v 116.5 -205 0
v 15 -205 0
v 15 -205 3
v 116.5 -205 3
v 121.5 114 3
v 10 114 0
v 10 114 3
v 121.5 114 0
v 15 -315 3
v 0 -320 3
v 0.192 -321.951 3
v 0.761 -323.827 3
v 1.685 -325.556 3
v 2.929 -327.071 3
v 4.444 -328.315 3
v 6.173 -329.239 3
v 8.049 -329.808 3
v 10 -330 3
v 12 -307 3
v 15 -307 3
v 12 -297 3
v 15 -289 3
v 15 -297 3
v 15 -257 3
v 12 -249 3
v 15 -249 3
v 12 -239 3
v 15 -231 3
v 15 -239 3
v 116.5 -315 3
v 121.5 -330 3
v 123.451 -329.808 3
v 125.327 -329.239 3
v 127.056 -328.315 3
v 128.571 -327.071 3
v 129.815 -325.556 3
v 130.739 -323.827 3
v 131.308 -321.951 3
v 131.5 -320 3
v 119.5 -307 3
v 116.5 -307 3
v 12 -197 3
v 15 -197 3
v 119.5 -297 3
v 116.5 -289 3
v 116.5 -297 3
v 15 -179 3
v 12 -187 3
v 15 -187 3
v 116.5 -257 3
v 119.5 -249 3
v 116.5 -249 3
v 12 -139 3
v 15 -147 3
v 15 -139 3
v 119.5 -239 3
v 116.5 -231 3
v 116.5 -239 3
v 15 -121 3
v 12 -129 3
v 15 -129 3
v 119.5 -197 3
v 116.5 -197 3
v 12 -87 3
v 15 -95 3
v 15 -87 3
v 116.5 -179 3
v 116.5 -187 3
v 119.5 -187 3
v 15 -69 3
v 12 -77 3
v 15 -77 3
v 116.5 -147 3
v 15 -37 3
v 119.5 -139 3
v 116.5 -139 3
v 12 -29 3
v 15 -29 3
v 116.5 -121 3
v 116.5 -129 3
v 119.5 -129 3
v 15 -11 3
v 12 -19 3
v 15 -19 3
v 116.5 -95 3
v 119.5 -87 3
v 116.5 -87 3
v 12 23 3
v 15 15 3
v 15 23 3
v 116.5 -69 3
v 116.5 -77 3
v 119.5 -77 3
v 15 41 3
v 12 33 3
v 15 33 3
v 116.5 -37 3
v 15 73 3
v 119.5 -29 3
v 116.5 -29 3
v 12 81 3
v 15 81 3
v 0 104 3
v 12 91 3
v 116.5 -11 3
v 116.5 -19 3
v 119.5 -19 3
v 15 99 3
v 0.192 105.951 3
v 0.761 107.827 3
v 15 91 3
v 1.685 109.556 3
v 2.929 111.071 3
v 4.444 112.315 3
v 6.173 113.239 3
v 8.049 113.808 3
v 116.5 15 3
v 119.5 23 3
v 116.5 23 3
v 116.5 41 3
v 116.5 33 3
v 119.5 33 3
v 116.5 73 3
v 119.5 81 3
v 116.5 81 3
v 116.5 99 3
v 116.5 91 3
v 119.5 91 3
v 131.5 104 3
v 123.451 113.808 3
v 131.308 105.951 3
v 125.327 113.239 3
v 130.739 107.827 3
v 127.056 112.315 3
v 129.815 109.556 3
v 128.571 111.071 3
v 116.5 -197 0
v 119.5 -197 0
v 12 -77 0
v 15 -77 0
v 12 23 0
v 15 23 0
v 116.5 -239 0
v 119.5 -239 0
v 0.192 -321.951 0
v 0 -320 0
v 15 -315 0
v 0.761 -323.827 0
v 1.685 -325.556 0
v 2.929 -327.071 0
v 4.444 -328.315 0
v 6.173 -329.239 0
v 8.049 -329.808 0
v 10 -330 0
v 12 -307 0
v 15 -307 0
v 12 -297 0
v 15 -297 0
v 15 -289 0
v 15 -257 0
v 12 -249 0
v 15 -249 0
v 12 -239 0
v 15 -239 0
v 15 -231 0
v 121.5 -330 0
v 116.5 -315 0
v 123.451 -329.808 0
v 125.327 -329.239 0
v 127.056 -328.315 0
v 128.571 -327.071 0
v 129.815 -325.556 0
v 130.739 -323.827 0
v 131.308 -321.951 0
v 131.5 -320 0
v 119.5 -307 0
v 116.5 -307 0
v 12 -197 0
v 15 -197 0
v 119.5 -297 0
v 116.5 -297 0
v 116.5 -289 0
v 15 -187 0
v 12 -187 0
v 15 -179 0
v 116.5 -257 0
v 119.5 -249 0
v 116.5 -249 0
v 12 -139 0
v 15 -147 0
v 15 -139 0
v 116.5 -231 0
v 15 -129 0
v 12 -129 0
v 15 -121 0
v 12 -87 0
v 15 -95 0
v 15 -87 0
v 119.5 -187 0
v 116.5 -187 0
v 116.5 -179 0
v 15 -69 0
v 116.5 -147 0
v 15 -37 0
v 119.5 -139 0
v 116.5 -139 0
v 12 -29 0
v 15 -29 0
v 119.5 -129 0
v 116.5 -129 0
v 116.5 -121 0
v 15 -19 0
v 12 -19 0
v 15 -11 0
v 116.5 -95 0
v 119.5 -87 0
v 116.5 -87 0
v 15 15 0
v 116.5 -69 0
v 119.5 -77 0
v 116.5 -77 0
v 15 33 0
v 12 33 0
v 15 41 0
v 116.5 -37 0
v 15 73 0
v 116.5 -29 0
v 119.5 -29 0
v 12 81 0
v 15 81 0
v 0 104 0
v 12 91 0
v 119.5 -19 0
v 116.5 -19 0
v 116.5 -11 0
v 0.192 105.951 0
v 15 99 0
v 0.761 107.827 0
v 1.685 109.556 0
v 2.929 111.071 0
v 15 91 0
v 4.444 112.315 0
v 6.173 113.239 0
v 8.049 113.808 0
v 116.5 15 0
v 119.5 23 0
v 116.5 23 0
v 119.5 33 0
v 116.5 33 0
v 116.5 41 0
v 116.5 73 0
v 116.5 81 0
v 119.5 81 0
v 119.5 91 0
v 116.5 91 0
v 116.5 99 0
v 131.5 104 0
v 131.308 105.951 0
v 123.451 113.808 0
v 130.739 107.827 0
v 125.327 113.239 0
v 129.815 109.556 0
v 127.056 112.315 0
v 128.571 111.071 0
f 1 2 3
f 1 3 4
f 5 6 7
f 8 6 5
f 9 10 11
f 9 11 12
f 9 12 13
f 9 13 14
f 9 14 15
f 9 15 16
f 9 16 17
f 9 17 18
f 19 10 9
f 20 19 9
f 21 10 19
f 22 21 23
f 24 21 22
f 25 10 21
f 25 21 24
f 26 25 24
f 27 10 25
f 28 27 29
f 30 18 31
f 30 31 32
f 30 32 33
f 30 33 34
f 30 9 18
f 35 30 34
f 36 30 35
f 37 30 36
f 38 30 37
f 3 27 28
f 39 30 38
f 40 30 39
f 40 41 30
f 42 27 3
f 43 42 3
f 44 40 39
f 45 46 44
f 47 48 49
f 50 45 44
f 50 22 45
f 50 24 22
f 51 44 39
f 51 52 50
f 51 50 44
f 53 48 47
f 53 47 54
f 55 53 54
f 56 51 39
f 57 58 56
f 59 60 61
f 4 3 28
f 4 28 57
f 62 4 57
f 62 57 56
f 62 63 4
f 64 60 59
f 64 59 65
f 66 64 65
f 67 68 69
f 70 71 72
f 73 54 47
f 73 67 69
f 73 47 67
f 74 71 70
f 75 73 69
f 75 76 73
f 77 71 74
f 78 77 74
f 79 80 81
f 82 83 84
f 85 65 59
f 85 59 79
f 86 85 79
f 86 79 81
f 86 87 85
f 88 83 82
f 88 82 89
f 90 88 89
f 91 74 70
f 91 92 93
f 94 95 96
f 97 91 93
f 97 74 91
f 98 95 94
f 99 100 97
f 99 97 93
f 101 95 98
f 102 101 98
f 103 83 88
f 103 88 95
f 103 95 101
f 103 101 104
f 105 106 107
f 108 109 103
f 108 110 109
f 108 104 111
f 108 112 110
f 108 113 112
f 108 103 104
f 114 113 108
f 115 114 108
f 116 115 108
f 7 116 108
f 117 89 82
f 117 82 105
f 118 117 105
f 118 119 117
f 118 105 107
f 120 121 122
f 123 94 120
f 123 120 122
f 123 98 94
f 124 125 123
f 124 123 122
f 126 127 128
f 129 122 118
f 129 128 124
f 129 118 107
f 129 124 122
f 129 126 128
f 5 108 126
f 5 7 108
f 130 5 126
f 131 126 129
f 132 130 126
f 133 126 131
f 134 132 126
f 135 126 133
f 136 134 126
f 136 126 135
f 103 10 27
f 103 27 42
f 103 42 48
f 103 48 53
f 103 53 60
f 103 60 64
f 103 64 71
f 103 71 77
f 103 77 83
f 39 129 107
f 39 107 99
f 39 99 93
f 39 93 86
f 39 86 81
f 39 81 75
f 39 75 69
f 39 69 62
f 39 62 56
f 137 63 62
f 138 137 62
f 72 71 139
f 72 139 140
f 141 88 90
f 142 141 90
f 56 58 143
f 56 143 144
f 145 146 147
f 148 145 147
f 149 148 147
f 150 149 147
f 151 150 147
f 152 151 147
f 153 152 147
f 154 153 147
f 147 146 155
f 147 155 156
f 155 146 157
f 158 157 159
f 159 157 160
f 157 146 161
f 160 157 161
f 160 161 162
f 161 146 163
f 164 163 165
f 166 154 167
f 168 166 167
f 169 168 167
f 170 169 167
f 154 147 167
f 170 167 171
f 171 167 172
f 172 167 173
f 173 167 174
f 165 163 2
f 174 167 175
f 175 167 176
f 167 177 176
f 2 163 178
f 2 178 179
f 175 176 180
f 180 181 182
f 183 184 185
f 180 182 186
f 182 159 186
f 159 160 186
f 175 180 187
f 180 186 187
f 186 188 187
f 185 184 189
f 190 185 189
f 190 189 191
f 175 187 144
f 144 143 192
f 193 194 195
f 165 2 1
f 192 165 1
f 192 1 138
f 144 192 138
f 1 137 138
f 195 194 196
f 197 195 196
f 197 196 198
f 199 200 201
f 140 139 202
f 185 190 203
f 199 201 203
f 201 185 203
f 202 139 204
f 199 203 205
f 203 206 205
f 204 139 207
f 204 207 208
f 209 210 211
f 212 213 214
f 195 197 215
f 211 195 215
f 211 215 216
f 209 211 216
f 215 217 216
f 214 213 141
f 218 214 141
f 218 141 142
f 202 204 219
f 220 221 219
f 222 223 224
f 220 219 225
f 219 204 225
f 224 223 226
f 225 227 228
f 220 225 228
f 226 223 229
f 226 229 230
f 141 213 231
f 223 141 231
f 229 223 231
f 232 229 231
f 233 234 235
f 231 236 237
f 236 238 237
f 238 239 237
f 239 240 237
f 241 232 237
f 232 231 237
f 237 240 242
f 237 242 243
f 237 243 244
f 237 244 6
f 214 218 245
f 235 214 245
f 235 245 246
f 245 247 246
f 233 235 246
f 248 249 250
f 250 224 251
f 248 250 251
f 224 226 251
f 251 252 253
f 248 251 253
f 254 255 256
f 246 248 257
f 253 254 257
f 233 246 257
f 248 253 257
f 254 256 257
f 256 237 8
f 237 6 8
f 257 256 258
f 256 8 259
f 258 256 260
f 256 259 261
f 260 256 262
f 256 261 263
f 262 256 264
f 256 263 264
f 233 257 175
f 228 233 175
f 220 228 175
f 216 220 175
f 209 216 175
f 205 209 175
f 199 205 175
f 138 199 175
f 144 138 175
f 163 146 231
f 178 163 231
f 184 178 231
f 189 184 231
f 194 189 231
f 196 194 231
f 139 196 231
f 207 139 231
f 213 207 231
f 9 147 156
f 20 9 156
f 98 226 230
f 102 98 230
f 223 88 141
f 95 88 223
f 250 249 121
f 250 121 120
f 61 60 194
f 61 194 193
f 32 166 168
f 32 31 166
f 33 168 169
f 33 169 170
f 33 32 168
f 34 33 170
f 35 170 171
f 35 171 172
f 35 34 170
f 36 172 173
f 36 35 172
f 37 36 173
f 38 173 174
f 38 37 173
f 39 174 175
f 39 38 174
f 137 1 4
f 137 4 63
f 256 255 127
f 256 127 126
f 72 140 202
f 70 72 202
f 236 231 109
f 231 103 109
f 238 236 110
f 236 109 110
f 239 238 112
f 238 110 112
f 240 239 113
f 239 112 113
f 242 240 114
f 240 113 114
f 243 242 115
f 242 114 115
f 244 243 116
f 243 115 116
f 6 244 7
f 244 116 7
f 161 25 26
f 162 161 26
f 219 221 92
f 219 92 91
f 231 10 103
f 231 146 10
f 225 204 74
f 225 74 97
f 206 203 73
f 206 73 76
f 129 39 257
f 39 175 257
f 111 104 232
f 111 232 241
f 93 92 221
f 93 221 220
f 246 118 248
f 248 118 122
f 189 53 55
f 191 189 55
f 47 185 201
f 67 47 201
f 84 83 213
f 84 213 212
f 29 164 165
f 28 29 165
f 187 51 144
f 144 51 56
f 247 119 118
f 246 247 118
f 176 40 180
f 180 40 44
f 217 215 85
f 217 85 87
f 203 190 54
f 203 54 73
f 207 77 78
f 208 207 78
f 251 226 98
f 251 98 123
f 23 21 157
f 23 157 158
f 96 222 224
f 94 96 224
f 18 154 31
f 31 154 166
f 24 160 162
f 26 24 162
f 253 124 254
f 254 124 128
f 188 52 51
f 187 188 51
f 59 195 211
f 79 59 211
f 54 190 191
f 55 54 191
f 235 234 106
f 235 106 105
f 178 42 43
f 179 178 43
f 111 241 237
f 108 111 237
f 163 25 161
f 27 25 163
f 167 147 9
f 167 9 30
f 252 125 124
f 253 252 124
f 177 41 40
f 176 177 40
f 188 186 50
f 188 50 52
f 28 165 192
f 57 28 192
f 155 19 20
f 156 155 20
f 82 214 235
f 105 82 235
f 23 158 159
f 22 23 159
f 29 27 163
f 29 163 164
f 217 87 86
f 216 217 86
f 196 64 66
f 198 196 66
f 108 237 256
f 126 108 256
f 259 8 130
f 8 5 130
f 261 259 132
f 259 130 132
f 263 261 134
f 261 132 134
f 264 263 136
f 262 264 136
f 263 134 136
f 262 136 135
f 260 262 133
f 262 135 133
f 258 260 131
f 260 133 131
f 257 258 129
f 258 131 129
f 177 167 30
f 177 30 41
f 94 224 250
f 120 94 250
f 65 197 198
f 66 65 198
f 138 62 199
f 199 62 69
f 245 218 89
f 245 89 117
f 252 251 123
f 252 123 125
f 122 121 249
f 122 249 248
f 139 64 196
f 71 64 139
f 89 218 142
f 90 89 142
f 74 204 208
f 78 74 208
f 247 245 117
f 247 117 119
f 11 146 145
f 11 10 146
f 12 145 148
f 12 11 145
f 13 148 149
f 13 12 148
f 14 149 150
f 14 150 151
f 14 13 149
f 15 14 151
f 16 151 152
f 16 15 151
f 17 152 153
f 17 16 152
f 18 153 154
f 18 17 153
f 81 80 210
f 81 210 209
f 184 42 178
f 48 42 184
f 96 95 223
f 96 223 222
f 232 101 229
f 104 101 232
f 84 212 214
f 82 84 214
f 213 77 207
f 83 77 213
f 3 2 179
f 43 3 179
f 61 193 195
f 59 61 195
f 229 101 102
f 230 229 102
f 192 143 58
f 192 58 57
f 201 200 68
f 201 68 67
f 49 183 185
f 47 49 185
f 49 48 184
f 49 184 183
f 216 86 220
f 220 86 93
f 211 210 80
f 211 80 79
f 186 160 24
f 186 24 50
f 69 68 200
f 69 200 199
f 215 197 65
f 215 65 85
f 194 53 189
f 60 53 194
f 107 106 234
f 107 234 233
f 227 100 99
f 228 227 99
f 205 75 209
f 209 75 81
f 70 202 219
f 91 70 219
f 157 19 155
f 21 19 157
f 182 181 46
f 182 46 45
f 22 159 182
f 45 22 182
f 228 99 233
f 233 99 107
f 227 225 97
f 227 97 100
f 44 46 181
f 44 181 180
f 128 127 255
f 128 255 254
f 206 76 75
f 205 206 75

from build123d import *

# Parameters (mm, degrees)
SKIZZE1_W                       = 131.5
SKIZZE1_H                       = 114
SKIZZE1_W_2                     = 101.5
SKIZZE1_H_2                     = 26
AUFSATZ_LINEAR_AUSTRAGEN1_DEPTH = 3
SKIZZE2_W                       = 3
SKIZZE2_H                       = 10
SCHNITT_LINEAR_AUSTRAGEN2_DEPTH = 3
LINEARES_MUSTER2_COUNT          = 4
LINEARES_MUSTER2_PITCH          = 110
VERRUNDUNG1_R                   = 10


with BuildPart() as part:
    # Skizze1 → Aufsatz-Linear austragen1 (new body)
    with BuildSketch(Plane.XY):
        with Locations((65.75, 57)):
            Rectangle(SKIZZE1_W, SKIZZE1_H)
        with Locations((65.75, 28)):
            Rectangle(SKIZZE1_W_2, SKIZZE1_H_2, mode=Mode.SUBTRACT)
        with Locations((65.75, 86)):
            Rectangle(SKIZZE1_W_2, SKIZZE1_H_2, mode=Mode.SUBTRACT)
    aufsatz_linear_austragen1 = extrude(amount=AUFSATZ_LINEAR_AUSTRAGEN1_DEPTH)

    # Skizze2 → Schnitt-Linear austragen2 (cut)
    with BuildSketch(Plane.XY.offset(3)):
        with Locations((13.5, 86)):
            Rectangle(SKIZZE2_W, SKIZZE2_H)
        with Locations((118, 86)):
            Rectangle(SKIZZE2_W, SKIZZE2_H)
        with Locations((13.5, 28)):
            Rectangle(SKIZZE2_W, SKIZZE2_H)
        with Locations((118, 28)):
            Rectangle(SKIZZE2_W, SKIZZE2_H)
    schnitt_linear_austragen2 = extrude(amount=-SCHNITT_LINEAR_AUSTRAGEN2_DEPTH, mode=Mode.SUBTRACT)

    # Lineares Muster2: Aufsatz-Linear austragen1, Schnitt-Linear austragen2 ×4
    with Locations(*[(0, -i * LINEARES_MUSTER2_PITCH, 0) for i in range(1, LINEARES_MUSTER2_COUNT)]):
        add(aufsatz_linear_austragen1)
        add(schnitt_linear_austragen2, mode=Mode.SUBTRACT)

    # Verrundung1
    verrundung1_edges = [part.edges().sort_by_distance(p)[0] for p in [
        (131.5, -330, 1.5),
        (0, -330, 1.5),
        (0, 114, 1.5),
        (131.5, 114, 1.5),
    ]]
    fillet(verrundung1_edges, radius=VERRUNDUNG1_R)


solid = part.part
